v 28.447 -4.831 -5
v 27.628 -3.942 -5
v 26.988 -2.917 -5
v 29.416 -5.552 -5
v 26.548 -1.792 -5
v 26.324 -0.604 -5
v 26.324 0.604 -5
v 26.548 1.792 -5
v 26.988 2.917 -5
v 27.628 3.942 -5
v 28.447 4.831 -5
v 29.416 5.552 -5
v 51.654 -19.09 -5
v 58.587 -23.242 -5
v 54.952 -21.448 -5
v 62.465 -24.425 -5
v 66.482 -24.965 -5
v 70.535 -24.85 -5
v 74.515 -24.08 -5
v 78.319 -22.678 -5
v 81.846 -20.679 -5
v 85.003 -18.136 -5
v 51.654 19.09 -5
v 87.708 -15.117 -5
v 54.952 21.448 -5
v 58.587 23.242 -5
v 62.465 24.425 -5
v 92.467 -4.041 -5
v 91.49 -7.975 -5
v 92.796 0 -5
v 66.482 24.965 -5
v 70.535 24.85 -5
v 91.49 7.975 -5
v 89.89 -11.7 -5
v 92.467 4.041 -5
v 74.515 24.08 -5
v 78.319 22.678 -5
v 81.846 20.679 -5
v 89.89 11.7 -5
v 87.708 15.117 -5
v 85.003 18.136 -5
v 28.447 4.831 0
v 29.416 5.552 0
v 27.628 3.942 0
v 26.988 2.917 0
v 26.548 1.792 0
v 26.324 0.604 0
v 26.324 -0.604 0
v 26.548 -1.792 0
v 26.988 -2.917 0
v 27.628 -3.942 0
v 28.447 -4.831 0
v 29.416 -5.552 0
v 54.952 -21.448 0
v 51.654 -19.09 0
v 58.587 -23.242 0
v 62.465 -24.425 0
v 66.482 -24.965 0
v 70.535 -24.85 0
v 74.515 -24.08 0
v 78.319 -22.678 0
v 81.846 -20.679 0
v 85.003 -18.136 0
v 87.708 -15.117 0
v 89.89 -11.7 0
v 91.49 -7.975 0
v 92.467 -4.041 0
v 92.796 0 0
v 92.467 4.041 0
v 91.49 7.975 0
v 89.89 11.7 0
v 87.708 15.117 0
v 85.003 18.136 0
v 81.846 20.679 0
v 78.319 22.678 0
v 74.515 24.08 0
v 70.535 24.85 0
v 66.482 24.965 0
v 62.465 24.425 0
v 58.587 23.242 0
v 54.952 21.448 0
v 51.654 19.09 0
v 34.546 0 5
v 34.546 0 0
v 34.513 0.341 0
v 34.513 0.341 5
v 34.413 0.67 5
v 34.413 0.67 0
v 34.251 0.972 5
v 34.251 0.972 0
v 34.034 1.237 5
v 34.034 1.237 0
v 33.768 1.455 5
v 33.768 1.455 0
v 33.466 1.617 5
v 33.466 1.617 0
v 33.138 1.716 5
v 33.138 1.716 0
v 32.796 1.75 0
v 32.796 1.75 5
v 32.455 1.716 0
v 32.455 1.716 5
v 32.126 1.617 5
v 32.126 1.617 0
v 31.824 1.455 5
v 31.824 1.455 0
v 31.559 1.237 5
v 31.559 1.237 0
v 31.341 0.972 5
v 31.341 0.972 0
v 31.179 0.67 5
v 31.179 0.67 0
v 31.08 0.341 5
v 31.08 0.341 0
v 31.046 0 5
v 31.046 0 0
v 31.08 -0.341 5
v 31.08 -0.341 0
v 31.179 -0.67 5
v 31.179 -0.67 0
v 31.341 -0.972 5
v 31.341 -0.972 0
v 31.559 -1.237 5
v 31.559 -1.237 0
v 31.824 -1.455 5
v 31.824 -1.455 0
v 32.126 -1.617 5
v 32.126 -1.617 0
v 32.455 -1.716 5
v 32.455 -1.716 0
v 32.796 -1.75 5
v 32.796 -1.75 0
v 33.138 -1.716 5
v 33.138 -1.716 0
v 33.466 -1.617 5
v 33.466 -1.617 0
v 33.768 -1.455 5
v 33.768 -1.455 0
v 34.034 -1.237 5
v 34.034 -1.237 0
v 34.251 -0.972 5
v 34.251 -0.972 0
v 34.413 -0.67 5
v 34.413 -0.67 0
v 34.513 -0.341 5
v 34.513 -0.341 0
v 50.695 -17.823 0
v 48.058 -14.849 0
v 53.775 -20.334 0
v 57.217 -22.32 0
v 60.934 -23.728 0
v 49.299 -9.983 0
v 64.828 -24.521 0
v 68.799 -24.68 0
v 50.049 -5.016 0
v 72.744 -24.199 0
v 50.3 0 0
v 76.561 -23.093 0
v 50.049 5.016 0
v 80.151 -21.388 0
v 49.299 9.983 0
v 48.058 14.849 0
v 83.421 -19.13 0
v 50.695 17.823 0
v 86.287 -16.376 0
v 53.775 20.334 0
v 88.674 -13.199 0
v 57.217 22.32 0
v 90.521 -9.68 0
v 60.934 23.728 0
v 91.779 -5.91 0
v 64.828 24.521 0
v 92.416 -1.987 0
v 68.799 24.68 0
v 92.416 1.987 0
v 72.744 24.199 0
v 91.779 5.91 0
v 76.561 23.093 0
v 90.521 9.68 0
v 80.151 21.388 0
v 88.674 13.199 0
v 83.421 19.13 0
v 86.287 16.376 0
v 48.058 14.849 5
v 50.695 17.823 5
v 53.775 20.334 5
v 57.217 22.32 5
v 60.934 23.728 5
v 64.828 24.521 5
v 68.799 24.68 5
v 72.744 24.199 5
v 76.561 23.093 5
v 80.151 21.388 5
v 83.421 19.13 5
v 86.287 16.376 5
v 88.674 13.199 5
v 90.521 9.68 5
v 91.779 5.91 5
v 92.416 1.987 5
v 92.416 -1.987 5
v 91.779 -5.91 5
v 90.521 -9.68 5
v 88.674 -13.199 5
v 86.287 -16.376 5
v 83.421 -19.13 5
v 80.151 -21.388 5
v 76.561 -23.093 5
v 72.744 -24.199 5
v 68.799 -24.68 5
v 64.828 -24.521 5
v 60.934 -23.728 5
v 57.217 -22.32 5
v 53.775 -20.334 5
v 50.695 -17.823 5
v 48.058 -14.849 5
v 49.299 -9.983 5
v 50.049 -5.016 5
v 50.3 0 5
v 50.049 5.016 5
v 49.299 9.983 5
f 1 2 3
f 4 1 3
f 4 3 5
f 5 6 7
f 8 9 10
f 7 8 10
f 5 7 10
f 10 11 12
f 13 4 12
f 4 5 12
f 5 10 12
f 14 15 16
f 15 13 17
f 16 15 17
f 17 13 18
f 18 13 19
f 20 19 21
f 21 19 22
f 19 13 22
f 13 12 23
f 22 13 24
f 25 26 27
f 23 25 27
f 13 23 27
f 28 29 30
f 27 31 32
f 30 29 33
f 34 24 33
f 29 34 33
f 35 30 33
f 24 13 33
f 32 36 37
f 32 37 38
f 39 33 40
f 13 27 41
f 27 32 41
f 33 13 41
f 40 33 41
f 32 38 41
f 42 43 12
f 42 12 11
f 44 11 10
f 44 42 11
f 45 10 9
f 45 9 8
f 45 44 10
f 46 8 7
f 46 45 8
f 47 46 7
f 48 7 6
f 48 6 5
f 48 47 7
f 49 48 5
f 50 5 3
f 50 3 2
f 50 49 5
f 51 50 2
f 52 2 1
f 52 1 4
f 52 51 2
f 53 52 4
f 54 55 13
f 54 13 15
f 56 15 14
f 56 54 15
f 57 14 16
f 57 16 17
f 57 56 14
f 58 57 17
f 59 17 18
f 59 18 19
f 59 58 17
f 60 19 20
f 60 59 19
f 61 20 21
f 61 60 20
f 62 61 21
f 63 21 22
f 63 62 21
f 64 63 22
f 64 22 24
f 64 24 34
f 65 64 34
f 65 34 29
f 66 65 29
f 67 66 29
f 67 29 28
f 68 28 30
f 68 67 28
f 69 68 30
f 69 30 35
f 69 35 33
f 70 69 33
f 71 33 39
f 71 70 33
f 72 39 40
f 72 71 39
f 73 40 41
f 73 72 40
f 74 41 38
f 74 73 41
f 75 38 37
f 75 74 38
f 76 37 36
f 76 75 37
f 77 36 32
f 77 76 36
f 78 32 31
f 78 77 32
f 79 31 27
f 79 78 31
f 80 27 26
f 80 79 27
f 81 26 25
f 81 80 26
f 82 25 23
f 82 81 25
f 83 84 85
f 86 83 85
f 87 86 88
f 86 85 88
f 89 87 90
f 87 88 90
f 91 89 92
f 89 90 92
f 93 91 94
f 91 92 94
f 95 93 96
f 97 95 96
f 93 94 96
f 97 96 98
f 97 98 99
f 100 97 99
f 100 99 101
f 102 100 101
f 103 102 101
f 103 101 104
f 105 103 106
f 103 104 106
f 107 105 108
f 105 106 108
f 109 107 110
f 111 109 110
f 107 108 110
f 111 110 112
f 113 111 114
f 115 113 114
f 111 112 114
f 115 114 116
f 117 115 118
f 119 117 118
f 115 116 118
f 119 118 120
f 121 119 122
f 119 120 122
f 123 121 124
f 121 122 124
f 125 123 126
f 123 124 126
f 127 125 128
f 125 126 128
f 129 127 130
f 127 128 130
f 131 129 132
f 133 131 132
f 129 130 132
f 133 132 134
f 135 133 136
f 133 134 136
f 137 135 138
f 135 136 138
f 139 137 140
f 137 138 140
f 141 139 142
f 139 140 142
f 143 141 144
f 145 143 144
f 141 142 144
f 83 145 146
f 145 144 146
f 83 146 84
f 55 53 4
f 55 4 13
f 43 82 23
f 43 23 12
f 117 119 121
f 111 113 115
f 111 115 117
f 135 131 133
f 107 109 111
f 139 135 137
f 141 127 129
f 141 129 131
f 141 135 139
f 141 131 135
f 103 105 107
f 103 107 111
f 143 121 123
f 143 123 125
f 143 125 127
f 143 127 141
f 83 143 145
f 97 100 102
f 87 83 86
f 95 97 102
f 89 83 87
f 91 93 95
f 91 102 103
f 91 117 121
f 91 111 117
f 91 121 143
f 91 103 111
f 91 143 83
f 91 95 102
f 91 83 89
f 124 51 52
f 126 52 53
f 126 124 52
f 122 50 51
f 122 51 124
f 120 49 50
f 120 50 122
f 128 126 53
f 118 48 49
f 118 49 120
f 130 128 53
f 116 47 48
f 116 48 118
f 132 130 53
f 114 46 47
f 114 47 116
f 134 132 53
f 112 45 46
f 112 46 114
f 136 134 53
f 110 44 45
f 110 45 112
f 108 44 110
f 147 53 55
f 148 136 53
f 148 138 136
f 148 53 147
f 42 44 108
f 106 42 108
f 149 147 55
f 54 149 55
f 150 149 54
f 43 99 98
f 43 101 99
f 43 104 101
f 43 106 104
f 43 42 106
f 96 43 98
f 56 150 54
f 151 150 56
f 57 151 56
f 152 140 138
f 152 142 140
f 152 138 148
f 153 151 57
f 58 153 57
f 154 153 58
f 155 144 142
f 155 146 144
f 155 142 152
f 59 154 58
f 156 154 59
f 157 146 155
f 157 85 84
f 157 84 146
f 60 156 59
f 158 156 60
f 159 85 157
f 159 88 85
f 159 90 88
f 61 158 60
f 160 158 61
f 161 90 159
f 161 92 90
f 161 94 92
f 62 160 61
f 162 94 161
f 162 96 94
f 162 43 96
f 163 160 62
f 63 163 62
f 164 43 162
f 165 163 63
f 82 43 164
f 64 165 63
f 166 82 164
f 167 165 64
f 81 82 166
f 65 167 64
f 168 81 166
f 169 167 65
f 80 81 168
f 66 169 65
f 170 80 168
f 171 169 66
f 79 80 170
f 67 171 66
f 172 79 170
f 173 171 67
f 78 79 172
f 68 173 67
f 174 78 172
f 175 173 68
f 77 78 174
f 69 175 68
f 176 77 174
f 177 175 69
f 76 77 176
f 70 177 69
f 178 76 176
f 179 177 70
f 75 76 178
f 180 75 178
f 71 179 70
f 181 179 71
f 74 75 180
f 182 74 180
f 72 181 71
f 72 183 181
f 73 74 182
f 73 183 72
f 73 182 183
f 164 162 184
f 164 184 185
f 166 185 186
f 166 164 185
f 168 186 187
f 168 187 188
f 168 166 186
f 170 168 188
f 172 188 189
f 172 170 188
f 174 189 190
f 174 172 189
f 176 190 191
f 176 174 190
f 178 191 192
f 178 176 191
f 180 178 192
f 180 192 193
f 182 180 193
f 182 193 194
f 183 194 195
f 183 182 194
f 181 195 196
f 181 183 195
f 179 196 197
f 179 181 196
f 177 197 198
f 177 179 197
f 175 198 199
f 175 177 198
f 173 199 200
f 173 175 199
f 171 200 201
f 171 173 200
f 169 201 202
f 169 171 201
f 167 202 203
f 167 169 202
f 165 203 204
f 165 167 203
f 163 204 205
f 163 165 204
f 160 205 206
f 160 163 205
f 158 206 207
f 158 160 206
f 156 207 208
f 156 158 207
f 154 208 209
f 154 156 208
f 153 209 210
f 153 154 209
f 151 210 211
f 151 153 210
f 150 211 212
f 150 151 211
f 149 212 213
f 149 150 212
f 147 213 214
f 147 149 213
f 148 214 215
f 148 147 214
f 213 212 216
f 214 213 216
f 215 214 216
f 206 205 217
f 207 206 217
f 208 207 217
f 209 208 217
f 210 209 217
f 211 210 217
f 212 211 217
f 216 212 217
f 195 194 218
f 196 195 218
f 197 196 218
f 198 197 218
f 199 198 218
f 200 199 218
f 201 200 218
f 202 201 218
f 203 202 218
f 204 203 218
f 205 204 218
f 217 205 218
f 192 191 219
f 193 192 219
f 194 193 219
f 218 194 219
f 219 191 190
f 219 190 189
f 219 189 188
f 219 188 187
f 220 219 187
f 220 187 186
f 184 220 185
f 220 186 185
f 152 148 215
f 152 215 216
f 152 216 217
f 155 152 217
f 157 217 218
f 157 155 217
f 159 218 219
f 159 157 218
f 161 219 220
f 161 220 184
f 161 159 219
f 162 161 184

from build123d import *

# Parameters (mm, degrees)
BOSS_EXTRUDE1_DEPTH = 5
SKETCH1_4_R         = 1.75
BOSS_EXTRUDE2_DEPTH = 5


with BuildPart() as part:
    # Sketch1 → Boss-Extrude1 (new body)
    with BuildSketch(Plane.XY):
        with BuildLine():
            ThreePointArc((51.653935363, -19.09000623), (92.796167617, 0), (51.653935363, 19.09000623))
            Line((51.653935363, 19.09000623), (29.416167617, 5.552080691))
            ThreePointArc((29.416167617, 5.552080691), (26.296167617, 0), (29.416167617, -5.552080691))
            Line((29.416167617, -5.552080691), (51.653935363, -19.09000623))
        make_face()
    extrude(amount=-BOSS_EXTRUDE1_DEPTH)

    # Sketch1<4> → Boss-Extrude2 (add)
    with BuildSketch(Plane.XY):
        with BuildLine():
            ThreePointArc((48.058176241, -14.849299526), (92.496167617, 0), (48.058176241, 14.849299526))
            ThreePointArc((48.058176241, 14.849299526), (50.3, 0), (48.058176241, -14.849299526))
        make_face()
        with Locations((32.796167617, 0)):
            Circle(SKETCH1_4_R)
    extrude(amount=BOSS_EXTRUDE2_DEPTH)


solid = part.part
